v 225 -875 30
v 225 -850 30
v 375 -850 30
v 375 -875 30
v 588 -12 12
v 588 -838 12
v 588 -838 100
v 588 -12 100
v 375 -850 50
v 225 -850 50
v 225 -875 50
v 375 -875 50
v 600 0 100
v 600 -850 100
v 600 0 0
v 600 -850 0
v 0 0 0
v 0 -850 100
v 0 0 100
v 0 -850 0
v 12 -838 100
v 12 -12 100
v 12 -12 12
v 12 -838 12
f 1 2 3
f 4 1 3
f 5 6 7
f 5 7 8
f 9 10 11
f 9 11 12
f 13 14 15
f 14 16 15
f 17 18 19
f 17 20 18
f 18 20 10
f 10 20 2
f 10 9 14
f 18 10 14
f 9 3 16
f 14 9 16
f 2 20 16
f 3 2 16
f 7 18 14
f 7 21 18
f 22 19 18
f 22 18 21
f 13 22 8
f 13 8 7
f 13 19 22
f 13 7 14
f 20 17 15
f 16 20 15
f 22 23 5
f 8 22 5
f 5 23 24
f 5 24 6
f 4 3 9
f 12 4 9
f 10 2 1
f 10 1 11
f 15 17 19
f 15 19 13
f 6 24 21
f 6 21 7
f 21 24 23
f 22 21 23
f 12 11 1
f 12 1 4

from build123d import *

# Parameters (mm, degrees)
F0_W     = 600
F0_H     = 850
F1_DEPTH = 12
F2_W     = 600
F2_H     = 850
F2_W_2   = 576
F2_H_2   = 826
F3_DEPTH = 88
F4_W     = 150
F4_H     = 20
F5_DEPTH = 25


with BuildPart() as f1:
    # F0 (on Top) → F1 (new body)
    with BuildSketch(Plane.XY):
        with Locations((300, -425)):
            Rectangle(F0_W, F0_H)
    extrude(amount=F1_DEPTH)

    # F2 (on face) → F3 (join)
    with BuildSketch(Plane.XY.offset(12)):
        with Locations((300, -425)):
            Rectangle(F2_W, F2_H)
        with Locations((300, -425)):
            Rectangle(F2_W_2, F2_H_2, mode=Mode.SUBTRACT)
    extrude(amount=F3_DEPTH)

    # F4 (on face) → F5 (join)
    with BuildSketch(Plane.XZ.offset(850)):
        with Locations((300, 40)):
            Rectangle(F4_W, F4_H)
    extrude(amount=F5_DEPTH)


solid = f1.part
